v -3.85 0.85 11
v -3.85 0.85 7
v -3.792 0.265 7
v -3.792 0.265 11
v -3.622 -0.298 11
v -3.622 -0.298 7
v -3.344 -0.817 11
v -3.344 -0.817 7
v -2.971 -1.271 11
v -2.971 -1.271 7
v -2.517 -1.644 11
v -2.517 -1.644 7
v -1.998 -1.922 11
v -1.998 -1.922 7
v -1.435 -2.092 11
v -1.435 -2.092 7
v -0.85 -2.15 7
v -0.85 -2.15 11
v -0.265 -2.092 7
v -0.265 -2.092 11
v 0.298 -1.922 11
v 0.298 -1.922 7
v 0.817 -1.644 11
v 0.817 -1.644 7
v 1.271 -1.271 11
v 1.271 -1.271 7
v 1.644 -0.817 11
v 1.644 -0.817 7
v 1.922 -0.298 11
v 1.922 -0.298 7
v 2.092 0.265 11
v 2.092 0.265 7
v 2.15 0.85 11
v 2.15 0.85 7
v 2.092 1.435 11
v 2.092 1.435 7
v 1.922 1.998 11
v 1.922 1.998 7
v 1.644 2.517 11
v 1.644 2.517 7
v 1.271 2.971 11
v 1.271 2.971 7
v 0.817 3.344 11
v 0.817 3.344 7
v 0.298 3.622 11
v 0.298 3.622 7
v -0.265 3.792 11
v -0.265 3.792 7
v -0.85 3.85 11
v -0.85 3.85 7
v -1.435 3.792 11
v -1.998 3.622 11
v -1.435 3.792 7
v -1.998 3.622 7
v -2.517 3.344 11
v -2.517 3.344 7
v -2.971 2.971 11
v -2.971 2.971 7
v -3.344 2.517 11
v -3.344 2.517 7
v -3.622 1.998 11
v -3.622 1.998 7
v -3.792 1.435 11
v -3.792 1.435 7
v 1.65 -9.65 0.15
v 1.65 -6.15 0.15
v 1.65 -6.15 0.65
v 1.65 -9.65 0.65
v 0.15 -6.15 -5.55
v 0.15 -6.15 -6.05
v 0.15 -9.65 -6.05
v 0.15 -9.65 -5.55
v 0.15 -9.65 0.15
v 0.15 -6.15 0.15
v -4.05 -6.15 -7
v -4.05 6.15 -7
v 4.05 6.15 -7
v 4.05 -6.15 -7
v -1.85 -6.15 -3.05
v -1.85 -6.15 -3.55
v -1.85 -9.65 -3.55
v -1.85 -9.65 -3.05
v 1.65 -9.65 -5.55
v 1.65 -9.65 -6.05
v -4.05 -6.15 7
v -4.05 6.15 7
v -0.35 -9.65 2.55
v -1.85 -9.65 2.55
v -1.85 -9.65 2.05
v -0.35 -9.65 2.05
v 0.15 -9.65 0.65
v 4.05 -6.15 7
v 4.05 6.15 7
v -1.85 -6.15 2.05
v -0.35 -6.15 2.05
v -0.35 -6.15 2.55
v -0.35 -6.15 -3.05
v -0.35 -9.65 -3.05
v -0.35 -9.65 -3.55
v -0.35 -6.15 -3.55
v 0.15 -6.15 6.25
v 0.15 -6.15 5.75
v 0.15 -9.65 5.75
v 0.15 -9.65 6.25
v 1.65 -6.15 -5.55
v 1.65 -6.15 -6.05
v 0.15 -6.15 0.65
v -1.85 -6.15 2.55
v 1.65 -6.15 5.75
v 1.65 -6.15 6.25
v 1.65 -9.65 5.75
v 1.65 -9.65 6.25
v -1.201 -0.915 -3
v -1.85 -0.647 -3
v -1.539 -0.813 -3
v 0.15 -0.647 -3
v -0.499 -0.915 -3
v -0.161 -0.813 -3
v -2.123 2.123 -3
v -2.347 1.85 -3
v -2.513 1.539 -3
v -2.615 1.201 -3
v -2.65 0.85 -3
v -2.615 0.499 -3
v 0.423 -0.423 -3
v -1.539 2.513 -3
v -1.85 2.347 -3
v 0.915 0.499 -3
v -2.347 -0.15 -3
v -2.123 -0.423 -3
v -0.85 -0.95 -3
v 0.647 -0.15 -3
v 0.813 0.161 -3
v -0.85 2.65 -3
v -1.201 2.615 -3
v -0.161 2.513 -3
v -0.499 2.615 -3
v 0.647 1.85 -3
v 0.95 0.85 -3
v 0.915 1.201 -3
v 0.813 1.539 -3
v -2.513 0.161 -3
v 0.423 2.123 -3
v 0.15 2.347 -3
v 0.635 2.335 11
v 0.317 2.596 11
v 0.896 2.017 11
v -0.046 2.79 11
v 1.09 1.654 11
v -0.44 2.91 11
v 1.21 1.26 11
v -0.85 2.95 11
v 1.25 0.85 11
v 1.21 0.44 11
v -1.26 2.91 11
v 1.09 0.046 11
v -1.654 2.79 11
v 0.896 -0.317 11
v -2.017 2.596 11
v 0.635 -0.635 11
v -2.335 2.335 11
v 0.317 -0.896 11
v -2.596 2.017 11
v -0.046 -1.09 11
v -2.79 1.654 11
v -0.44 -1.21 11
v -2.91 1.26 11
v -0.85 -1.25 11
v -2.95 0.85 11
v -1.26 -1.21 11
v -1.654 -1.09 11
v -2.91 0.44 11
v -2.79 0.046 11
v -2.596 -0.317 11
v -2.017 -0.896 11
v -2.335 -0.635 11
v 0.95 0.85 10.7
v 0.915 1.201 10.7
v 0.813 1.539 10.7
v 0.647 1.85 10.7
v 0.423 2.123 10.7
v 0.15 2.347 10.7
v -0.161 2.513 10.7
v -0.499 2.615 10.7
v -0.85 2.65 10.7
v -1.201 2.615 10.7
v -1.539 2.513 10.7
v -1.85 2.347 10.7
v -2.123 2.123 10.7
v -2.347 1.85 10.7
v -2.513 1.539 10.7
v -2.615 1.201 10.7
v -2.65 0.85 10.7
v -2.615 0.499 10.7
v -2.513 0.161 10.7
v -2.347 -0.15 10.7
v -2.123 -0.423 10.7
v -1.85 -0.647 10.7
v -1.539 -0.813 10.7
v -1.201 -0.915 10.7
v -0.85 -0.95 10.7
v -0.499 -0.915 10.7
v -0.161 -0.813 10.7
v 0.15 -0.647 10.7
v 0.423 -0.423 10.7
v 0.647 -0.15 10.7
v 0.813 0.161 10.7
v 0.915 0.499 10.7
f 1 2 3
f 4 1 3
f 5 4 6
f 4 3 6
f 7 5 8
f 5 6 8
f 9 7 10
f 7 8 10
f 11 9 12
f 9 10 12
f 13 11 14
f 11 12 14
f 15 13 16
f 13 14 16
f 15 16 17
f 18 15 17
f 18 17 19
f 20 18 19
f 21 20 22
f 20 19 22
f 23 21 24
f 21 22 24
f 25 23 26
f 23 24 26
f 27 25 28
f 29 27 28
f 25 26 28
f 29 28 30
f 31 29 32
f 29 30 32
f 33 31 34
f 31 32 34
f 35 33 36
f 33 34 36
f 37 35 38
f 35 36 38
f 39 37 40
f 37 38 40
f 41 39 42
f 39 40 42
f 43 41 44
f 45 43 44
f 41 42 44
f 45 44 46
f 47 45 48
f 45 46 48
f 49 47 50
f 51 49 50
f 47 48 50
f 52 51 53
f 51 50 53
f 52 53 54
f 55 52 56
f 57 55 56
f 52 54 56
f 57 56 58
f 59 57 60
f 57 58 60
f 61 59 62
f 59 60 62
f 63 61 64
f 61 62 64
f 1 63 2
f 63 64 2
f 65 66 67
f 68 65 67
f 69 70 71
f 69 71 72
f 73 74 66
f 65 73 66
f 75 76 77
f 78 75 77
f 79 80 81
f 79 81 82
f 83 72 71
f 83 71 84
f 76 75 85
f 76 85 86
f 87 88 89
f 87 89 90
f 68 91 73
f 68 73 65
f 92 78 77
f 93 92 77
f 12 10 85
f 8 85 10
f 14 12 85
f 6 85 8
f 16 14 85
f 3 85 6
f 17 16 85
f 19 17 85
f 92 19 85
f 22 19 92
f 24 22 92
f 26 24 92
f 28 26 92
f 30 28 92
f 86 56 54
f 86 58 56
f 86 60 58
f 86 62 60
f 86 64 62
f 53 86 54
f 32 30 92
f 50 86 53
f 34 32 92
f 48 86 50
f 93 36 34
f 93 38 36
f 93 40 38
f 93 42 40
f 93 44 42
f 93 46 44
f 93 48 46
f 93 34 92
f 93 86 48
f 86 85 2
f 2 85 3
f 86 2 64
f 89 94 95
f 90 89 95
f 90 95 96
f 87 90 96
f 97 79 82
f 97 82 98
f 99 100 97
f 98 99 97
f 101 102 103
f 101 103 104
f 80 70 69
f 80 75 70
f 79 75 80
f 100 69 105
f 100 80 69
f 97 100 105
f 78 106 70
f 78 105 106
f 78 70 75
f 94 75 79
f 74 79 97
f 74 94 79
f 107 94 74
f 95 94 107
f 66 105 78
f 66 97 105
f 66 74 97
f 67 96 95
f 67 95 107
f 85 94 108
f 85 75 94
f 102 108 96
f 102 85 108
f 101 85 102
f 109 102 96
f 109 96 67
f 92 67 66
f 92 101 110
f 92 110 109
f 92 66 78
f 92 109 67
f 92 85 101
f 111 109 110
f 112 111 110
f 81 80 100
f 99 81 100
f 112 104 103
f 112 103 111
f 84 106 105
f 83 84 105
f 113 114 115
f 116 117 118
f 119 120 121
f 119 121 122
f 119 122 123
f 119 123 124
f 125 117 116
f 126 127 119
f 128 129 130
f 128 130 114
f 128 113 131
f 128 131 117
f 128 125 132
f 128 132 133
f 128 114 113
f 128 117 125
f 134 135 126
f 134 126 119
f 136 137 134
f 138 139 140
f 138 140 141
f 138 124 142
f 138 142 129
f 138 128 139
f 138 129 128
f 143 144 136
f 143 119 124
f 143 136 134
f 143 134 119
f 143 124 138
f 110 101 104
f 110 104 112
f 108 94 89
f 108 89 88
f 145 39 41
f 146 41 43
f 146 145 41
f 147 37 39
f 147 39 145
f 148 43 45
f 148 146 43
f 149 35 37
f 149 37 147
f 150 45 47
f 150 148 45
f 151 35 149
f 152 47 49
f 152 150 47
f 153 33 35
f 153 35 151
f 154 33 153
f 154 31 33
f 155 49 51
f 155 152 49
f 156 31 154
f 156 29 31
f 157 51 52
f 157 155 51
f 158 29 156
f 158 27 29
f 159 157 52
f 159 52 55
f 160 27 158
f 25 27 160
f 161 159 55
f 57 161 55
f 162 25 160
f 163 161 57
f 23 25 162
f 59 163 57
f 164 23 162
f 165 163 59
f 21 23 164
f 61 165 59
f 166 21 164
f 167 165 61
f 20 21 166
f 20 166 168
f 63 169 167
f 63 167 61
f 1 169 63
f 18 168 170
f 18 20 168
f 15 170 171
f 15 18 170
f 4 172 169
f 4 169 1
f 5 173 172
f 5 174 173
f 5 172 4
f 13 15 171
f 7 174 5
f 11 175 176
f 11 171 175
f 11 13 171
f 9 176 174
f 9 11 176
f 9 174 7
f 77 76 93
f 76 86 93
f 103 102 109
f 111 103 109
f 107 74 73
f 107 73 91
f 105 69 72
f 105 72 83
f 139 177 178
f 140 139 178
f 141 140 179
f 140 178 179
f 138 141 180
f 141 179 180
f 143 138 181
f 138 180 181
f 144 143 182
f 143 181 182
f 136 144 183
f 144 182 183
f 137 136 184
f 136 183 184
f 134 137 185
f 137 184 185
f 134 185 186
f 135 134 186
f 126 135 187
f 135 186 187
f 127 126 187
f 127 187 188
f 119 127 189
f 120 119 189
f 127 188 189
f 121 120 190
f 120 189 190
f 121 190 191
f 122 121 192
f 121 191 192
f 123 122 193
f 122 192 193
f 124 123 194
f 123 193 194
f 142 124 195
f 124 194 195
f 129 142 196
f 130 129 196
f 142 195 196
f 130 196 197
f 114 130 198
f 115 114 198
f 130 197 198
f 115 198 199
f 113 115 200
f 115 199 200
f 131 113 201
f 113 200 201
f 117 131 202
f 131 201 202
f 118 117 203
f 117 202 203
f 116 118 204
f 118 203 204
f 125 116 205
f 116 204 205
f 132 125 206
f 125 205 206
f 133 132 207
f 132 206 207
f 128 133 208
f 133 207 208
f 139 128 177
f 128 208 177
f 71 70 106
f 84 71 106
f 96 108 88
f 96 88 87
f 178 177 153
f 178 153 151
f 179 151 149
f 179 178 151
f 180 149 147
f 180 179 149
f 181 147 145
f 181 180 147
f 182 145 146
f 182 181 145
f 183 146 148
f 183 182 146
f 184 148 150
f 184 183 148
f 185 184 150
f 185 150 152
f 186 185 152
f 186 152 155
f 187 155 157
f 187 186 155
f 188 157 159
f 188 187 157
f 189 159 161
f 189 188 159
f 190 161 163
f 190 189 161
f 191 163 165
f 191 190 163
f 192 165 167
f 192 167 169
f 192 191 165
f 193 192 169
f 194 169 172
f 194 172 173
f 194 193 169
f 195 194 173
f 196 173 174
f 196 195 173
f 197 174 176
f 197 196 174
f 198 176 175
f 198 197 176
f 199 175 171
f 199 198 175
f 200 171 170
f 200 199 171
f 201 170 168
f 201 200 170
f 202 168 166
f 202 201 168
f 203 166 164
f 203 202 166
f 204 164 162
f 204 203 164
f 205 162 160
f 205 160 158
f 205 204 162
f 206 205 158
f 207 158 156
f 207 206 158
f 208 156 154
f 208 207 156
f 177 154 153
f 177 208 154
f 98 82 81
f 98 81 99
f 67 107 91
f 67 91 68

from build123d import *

# Parameters (mm, degrees)
SKETCH1_W           = 8.1
SKETCH1_H           = 12.3
BOSS_EXTRUDE1_DEPTH = 7
SKETCH2_R           = 3
BOSS_EXTRUDE2_DEPTH = 4
SKETCH3_R           = 1.8
CUT_EXTRUDE1_DEPTH  = 14
CHAMFER1_SIZE       = 0.3
SKETCH4_W           = 1.5
SKETCH4_H           = 0.5
BOSS_EXTRUDE3_DEPTH = 3.5


with BuildPart() as part:
    # Sketch1 → Boss-Extrude1 (new, symmetric)
    with BuildSketch(Plane.XY):
        Rectangle(SKETCH1_W, SKETCH1_H)
    extrude(amount=BOSS_EXTRUDE1_DEPTH, both=True)

    # Sketch2 → Boss-Extrude2 (add)
    with BuildSketch(Plane.XY.offset(7)):
        with Locations(Location((-0.85, 0.85, 0), (0, 0, 180))):
            Circle(SKETCH2_R)
    extrude(amount=BOSS_EXTRUDE2_DEPTH)

    # Sketch3 → Cut-Extrude1 (cut)
    with BuildSketch(Plane.XY.offset(11)):
        with Locations((-0.85, 0.85)):
            Circle(SKETCH3_R)
    extrude(amount=-CUT_EXTRUDE1_DEPTH, mode=Mode.SUBTRACT)

    # Chamfer1
    chamfer1_edges = [part.edges().sort_by_distance(p)[0] for p in [
        (-2.65, 0.85, 11),
    ]]
    chamfer(chamfer1_edges, length=CHAMFER1_SIZE)

    # Sketch4 → Boss-Extrude3 (add)
    with BuildSketch(Plane.XZ.offset(6.15)):
        with Locations((0.9, 6)):
            Rectangle(SKETCH4_W, SKETCH4_H)
        with Locations((-1.1, 2.3)):
            Rectangle(SKETCH4_W, SKETCH4_H)
        with Locations((0.9, 0.4)):
            Rectangle(SKETCH4_W, SKETCH4_H)
        with Locations((-1.1, -3.3)):
            Rectangle(SKETCH4_W, SKETCH4_H)
        with Locations((0.9, -5.8)):
            Rectangle(SKETCH4_W, SKETCH4_H)
    extrude(amount=BOSS_EXTRUDE3_DEPTH)


solid = part.part
